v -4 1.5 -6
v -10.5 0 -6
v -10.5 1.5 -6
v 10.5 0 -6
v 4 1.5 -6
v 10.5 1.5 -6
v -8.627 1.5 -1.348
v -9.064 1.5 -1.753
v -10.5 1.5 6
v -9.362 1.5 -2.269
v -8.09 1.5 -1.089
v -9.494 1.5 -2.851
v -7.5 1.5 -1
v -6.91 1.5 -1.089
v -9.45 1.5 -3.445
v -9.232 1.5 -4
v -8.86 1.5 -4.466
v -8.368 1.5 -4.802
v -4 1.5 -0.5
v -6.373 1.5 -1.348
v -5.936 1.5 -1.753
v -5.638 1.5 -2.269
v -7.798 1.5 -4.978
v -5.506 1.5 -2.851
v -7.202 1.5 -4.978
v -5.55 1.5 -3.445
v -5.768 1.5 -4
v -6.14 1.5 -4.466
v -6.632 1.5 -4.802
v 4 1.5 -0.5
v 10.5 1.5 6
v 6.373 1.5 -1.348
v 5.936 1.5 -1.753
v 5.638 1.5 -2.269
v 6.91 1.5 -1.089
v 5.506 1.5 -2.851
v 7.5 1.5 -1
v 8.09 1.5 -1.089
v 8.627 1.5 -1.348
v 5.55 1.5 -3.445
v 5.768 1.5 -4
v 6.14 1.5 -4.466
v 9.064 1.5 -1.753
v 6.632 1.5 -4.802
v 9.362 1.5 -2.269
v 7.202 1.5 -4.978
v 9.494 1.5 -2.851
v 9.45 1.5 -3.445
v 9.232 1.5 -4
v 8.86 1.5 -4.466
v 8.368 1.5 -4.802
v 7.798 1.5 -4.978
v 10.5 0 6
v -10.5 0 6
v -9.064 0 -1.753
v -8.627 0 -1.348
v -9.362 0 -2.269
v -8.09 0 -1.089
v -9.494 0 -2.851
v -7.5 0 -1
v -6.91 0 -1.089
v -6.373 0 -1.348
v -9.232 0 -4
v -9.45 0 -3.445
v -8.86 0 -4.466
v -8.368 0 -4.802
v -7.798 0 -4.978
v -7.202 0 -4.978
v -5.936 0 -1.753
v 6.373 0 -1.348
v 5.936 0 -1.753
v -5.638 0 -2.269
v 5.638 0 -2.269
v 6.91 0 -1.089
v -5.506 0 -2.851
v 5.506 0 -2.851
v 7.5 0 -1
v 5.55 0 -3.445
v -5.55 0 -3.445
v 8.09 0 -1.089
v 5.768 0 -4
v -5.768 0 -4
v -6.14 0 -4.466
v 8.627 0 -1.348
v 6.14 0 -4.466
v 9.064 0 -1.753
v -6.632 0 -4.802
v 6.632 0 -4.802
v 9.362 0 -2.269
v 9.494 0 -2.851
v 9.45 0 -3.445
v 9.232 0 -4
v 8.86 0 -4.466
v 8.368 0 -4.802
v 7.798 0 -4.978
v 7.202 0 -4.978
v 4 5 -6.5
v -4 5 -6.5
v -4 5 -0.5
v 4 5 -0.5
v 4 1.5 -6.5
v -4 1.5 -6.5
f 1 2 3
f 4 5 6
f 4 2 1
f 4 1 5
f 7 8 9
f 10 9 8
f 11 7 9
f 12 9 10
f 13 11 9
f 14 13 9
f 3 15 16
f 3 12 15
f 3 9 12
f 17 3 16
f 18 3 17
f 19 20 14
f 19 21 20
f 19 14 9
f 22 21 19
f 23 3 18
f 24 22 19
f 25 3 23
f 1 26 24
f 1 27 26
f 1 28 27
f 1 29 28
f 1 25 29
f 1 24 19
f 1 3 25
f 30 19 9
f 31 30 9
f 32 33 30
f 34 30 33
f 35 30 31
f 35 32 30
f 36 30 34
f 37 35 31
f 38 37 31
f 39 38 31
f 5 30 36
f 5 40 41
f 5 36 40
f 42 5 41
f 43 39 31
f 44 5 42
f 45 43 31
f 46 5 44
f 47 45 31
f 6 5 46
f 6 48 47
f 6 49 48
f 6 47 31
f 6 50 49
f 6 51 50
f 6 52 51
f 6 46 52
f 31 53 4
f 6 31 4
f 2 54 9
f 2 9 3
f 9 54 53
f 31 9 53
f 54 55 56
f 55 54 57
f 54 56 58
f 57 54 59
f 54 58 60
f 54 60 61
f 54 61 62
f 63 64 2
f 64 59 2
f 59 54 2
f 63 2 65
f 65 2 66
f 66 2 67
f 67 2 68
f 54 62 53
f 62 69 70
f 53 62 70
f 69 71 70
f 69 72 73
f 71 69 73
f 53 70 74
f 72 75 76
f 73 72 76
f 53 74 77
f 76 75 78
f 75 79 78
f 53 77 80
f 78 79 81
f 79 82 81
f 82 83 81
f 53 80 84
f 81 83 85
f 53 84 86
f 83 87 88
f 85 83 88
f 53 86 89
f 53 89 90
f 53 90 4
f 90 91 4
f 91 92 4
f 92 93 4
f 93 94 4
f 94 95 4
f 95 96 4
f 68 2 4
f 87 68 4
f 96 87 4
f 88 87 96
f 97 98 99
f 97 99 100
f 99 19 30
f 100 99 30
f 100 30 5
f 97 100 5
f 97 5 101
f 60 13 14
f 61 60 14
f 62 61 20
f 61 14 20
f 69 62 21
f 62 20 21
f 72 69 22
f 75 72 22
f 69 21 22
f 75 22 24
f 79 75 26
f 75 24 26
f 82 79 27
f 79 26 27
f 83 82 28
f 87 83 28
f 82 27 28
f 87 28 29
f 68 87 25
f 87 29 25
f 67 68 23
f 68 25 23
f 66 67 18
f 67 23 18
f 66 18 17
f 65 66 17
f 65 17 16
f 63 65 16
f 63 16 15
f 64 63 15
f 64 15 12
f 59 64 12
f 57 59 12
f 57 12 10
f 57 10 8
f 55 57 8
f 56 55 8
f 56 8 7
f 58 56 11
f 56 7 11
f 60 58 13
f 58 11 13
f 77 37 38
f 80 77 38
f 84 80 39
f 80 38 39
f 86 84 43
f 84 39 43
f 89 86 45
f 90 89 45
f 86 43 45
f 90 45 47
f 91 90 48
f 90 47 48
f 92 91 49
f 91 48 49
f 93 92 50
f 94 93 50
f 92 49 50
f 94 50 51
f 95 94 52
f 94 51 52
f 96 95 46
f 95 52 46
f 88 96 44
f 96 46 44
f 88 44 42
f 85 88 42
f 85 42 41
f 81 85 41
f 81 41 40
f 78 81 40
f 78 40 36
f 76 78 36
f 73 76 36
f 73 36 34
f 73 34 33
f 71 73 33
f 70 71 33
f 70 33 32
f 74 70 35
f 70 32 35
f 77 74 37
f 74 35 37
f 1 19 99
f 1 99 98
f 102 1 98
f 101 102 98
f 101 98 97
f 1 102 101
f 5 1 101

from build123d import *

# Parameters (mm, degrees)
SKETCH1_W           = 21
SKETCH1_H           = 12
BOSS_EXTRUDE1_DEPTH = 1.5
SKETCH2_R           = 2
CUT_EXTRUDE1_DEPTH  = 1.5
SKETCH3_W           = 8
SKETCH3_H           = 6
BOSS_EXTRUDE2_DEPTH = 3.5


with BuildPart() as part:
    # Sketch1 → Boss-Extrude1 (new body)
    with BuildSketch(Plane(origin=(0, 0, 0), x_dir=(1, 0, 0), z_dir=(0, 1, 0))):
        Rectangle(SKETCH1_W, SKETCH1_H)
    extrude(amount=BOSS_EXTRUDE1_DEPTH)

    # Sketch2 → Cut-Extrude1 (cut)
    with BuildSketch(Plane(origin=(0, 1.5, 0), x_dir=(1, 0, 0), z_dir=(0, 1, 0))):
        with Locations(Location((-7.5, 3, 0), (0, 0, 270))):
            Circle(SKETCH2_R)
        with Locations(Location((7.5, 3, 0), (0, 0, 270))):
            Circle(SKETCH2_R)
    extrude(amount=-CUT_EXTRUDE1_DEPTH, mode=Mode.SUBTRACT)

    # Sketch3 → Boss-Extrude2 (add)
    with BuildSketch(Plane(origin=(0, 1.5, 0), x_dir=(1, 0, 0), z_dir=(0, 1, 0))):
        with Locations((0, 3.5)):
            Rectangle(SKETCH3_W, SKETCH3_H)
    extrude(amount=BOSS_EXTRUDE2_DEPTH)


solid = part.part
